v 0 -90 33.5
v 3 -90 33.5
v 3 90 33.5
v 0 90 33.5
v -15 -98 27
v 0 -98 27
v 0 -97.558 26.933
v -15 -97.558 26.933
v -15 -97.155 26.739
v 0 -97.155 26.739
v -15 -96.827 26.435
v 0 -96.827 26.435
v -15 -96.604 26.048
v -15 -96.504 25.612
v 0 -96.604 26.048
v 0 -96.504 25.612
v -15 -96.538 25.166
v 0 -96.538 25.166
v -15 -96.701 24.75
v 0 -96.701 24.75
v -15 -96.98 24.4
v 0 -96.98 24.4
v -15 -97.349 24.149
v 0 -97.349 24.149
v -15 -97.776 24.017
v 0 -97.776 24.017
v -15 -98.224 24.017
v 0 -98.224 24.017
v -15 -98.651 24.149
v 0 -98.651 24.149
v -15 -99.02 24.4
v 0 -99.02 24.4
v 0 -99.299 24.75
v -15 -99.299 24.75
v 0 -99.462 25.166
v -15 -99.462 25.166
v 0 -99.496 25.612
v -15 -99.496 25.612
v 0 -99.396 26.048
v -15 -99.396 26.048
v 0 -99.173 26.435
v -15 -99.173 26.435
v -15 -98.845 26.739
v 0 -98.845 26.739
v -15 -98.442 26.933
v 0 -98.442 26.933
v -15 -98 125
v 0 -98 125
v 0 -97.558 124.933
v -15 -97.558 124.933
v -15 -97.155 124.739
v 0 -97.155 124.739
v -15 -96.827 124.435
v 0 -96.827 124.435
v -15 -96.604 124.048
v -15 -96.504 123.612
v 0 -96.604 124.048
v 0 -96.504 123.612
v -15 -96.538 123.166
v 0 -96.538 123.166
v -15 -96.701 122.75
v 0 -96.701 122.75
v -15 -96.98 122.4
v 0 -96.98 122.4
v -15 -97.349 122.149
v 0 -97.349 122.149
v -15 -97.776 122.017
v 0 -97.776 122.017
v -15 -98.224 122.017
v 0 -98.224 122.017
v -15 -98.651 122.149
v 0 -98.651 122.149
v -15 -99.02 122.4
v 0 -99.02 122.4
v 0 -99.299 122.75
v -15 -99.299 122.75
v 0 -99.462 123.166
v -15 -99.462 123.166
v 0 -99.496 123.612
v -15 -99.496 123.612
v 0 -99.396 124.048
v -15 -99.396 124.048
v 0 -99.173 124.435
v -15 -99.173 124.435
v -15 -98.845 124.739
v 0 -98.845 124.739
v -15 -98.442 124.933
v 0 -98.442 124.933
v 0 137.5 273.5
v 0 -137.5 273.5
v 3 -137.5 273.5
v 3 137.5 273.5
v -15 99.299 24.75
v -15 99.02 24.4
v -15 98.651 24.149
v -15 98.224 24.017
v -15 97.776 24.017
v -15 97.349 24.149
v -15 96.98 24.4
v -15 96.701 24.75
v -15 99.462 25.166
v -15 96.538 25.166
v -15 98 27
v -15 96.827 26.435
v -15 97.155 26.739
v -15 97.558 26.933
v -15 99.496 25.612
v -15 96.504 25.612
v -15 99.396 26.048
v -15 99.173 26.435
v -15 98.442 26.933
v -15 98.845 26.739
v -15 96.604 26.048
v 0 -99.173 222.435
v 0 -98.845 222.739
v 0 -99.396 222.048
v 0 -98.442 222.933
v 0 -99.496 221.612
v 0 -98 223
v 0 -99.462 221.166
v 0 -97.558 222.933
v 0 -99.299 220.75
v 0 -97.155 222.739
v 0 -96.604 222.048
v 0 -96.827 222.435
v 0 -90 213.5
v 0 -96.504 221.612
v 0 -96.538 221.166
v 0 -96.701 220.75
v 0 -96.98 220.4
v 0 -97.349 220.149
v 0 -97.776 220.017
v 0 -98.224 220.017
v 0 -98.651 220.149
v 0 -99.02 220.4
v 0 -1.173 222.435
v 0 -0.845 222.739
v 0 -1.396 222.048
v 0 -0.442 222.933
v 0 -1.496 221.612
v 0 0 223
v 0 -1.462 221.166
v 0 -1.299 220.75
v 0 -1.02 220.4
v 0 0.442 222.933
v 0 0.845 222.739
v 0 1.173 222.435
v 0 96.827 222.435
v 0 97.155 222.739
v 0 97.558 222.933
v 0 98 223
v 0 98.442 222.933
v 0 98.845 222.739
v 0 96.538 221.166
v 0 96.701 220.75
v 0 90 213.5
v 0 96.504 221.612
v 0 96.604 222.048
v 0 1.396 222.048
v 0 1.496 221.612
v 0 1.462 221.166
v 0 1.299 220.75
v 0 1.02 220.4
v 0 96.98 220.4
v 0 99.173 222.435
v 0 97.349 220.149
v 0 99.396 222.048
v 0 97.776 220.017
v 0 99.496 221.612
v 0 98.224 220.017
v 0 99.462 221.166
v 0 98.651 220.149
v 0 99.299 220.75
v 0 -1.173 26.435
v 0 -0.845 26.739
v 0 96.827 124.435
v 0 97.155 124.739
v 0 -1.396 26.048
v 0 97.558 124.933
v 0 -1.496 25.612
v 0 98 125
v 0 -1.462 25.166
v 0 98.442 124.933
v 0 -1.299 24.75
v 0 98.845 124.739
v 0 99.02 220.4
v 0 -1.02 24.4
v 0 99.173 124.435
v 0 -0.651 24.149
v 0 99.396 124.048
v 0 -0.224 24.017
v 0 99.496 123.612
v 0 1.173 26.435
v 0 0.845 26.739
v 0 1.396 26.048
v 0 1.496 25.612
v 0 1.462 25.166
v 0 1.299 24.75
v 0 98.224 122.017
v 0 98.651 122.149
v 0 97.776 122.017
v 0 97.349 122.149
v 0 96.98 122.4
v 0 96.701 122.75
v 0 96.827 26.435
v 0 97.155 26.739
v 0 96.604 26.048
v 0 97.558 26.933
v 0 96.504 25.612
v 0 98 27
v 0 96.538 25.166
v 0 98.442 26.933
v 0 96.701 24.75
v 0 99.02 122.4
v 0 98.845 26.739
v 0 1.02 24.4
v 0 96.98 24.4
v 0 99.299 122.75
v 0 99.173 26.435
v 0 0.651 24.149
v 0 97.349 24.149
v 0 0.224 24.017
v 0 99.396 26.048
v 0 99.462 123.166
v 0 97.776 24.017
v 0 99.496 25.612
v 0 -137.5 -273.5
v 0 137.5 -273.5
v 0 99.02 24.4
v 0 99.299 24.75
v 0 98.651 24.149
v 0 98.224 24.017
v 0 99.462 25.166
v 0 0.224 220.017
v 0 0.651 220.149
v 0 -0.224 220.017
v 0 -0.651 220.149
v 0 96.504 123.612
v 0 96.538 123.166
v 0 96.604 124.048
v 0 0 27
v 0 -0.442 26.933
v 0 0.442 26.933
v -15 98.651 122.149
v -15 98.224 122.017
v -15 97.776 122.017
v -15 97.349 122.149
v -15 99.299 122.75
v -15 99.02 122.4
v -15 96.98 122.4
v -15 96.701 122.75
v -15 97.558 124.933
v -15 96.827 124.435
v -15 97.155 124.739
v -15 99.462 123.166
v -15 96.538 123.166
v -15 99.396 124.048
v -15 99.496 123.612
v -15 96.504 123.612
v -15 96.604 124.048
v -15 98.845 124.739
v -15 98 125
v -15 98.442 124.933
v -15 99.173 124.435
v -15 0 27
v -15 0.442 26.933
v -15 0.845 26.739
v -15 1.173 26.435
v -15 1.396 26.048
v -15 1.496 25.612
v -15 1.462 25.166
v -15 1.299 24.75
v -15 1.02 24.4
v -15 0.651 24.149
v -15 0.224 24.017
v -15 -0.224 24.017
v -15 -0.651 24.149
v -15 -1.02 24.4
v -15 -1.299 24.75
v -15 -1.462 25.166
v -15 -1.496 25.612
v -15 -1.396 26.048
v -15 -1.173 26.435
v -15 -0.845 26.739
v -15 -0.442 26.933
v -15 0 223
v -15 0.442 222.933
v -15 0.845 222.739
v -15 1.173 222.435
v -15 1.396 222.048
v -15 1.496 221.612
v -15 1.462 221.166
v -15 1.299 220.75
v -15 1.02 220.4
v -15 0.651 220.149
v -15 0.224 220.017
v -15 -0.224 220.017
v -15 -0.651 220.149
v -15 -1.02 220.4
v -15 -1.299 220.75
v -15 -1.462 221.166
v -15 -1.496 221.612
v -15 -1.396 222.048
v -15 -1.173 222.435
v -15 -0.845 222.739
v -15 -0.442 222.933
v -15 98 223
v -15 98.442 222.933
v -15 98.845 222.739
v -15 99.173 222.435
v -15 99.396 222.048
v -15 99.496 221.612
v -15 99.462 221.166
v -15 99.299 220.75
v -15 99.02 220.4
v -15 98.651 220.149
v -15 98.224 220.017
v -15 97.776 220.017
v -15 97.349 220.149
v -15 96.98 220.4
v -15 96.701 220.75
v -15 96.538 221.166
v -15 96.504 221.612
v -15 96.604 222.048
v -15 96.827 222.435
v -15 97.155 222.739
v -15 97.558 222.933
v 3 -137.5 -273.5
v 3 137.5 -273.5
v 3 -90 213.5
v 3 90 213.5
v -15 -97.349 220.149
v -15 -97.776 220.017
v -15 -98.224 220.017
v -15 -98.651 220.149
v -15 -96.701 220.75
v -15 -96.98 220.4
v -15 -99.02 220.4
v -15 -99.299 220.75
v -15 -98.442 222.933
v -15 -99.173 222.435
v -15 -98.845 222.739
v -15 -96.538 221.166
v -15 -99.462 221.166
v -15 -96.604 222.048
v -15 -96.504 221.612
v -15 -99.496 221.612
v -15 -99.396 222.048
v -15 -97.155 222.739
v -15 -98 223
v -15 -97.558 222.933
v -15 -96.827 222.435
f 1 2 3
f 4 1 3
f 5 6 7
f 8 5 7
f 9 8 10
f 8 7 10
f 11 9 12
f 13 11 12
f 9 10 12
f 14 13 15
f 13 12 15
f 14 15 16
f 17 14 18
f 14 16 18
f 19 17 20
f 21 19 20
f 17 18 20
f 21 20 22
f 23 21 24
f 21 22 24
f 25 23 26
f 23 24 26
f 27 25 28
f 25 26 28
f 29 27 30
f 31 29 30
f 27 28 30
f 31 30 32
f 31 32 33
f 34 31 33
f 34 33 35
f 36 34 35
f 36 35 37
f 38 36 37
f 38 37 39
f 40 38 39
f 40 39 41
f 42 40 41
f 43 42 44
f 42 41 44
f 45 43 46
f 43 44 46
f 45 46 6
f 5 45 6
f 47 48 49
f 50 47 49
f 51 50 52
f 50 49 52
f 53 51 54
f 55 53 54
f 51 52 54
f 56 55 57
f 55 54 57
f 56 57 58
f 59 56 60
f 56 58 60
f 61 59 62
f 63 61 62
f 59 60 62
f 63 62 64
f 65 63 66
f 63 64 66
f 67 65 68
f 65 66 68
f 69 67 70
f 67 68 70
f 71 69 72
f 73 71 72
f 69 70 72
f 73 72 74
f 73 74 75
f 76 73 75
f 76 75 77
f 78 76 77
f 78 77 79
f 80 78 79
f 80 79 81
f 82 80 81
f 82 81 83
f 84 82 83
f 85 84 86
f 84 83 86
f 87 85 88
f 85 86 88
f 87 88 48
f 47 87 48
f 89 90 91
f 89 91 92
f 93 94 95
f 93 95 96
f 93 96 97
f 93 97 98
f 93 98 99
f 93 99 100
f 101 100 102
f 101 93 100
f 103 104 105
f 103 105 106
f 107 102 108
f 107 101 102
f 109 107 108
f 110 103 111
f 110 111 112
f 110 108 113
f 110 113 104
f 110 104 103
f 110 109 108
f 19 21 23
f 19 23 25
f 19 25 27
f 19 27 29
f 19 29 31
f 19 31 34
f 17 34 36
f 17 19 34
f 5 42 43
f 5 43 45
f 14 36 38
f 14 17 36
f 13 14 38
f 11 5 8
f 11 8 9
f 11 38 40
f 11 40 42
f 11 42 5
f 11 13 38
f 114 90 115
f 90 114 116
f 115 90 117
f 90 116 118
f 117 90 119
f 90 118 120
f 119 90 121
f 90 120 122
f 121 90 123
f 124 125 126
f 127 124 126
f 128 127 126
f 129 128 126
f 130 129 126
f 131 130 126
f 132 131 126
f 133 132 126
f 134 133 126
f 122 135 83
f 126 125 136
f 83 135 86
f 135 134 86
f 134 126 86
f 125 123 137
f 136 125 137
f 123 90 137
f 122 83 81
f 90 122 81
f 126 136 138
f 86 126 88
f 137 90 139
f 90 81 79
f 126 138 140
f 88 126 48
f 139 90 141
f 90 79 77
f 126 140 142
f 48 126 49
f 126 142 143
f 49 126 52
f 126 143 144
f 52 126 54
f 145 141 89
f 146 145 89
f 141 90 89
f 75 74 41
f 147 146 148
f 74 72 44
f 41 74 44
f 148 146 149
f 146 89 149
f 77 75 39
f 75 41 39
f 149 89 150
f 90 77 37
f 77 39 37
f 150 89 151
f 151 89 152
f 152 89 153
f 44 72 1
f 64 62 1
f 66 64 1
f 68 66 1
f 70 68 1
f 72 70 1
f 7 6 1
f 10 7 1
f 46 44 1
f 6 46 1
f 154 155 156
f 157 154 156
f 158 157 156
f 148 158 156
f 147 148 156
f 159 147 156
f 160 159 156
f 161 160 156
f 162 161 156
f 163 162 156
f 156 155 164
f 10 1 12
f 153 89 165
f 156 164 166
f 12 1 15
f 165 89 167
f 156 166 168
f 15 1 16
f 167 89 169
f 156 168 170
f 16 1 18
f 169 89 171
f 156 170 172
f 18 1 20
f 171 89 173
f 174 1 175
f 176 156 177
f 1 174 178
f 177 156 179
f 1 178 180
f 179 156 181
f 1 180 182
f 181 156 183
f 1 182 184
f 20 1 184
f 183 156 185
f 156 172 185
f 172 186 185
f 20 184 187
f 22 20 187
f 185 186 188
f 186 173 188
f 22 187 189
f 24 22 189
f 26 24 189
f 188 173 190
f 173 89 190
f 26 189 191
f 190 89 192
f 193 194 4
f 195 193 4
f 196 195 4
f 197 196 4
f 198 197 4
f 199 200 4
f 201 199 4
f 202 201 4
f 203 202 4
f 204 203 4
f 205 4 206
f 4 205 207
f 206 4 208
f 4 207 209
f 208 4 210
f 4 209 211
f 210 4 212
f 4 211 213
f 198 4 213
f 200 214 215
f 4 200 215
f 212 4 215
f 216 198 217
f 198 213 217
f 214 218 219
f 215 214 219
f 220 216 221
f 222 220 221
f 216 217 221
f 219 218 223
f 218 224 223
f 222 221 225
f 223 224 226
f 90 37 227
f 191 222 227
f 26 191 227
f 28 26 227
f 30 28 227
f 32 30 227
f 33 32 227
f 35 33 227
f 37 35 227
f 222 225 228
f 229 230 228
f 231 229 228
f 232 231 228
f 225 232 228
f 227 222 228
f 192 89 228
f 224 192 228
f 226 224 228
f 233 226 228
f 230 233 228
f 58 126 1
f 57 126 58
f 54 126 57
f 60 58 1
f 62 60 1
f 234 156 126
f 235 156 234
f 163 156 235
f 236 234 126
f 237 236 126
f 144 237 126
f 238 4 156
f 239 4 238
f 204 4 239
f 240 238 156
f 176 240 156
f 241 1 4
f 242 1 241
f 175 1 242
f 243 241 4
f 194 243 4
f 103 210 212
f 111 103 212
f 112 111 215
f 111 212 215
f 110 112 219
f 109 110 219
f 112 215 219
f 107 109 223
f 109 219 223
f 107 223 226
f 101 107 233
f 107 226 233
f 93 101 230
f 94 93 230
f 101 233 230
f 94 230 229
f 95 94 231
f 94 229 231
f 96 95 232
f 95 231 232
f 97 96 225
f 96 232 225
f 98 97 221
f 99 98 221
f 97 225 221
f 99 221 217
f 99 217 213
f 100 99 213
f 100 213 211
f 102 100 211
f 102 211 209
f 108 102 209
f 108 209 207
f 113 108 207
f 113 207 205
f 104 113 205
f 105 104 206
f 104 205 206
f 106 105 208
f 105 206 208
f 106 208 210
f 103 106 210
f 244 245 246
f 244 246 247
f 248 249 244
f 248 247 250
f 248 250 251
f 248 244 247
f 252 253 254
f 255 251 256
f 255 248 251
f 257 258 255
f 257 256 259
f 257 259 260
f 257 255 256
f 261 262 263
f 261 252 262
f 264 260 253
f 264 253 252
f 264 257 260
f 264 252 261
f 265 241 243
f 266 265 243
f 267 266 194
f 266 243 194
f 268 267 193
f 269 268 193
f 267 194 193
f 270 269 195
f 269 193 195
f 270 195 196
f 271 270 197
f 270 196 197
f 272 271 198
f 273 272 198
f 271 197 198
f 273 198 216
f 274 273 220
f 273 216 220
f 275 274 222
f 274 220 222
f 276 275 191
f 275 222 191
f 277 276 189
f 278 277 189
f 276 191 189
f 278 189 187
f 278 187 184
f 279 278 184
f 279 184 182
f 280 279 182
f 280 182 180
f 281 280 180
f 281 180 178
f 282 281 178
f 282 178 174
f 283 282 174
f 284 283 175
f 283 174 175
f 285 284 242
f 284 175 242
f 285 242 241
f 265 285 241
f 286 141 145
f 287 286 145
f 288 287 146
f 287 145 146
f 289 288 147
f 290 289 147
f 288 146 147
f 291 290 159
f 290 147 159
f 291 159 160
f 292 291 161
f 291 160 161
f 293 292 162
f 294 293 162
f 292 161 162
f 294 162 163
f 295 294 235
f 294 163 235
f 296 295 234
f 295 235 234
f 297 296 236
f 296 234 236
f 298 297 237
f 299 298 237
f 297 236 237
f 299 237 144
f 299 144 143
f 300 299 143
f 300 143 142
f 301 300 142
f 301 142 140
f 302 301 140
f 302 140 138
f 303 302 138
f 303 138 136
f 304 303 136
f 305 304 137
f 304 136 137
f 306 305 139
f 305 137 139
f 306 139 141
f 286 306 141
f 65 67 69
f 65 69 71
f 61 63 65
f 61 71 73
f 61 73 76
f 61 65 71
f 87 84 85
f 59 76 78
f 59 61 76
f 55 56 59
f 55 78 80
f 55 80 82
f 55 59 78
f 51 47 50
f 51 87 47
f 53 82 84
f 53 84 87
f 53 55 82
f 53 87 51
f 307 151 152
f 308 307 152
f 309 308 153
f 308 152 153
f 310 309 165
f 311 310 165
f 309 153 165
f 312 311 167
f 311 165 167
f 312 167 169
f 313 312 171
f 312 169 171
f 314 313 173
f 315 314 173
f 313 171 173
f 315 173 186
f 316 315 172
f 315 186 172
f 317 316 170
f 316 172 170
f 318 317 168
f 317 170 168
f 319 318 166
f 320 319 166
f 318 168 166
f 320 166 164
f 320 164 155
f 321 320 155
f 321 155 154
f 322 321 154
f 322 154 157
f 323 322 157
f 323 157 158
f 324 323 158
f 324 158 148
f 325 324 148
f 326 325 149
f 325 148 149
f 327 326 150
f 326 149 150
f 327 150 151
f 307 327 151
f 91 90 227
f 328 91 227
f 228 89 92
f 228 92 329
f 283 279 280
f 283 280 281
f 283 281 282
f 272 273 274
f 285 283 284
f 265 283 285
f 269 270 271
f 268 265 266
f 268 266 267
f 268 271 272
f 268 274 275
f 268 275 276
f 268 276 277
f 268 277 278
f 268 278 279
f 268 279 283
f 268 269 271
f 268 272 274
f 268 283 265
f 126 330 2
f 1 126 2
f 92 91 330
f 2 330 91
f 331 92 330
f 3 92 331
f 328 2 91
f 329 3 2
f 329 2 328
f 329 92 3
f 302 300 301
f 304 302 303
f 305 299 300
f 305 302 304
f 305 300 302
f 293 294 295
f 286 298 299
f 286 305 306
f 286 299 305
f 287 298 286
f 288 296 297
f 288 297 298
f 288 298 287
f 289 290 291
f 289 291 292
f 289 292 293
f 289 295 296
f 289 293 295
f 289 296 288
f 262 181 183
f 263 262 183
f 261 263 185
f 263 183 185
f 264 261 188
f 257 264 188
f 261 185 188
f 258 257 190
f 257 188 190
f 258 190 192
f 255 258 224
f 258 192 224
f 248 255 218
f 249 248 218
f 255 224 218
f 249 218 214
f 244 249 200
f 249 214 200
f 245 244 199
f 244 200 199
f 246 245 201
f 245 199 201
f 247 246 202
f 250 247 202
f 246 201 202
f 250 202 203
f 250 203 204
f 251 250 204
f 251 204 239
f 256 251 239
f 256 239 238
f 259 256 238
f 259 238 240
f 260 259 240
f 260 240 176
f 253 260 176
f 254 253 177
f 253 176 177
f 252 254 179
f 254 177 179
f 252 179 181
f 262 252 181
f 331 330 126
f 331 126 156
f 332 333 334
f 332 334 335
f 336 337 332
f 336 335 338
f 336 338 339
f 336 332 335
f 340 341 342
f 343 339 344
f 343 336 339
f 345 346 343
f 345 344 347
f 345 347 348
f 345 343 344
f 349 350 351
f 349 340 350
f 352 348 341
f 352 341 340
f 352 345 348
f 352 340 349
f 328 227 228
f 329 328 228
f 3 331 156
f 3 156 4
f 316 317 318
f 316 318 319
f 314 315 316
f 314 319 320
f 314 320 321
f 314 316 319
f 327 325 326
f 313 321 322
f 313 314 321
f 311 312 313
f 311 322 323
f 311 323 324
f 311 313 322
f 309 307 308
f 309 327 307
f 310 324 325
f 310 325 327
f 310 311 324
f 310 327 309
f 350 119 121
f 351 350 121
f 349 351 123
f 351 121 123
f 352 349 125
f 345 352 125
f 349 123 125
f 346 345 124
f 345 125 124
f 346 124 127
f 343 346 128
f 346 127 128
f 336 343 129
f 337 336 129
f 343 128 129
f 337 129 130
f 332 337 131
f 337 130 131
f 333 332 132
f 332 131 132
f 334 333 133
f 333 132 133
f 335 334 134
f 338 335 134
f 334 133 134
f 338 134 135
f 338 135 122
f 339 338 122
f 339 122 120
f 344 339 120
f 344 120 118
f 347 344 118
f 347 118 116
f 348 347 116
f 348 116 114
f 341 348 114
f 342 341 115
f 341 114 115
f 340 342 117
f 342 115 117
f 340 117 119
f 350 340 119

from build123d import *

# Parameters (mm, degrees)
SKETCH1_W           = 547
SKETCH1_H           = 275
BOSS_EXTRUDE1_DEPTH = 3
SKETCH2_W           = 180
SKETCH2_H           = 180
CUT_EXTRUDE1_DEPTH  = 3
SKETCH3_R           = 1.5
BOSS_EXTRUDE2_DEPTH = 15


with BuildPart() as part:
    # Sketch1 → Boss-Extrude1 (new body)
    with BuildSketch(Plane(origin=(0, 0, 0), x_dir=(0, 0, -1), z_dir=(1, 0, 0))):
        Rectangle(SKETCH1_W, SKETCH1_H)
    extrude(amount=BOSS_EXTRUDE1_DEPTH)

    # Sketch2 → Cut-Extrude1 (cut)
    with BuildSketch(Plane(origin=(3, 0, 0), x_dir=(0, 0, -1), z_dir=(1, 0, 0))):
        with Locations((-123.5, 0)):
            Rectangle(SKETCH2_W, SKETCH2_H)
    extrude(amount=-CUT_EXTRUDE1_DEPTH, mode=Mode.SUBTRACT)

    # Sketch3 → Boss-Extrude2 (add)
    with BuildSketch(Plane.ZY):
        with Locations((25.5, 98)):
            Circle(SKETCH3_R)
        with Locations((221.5, -98)):
            Circle(SKETCH3_R)
        with Locations((123.5, 98)):
            Circle(SKETCH3_R)
        with Locations((221.5, 98)):
            Circle(SKETCH3_R)
        with Locations((123.5, -98)):
            Circle(SKETCH3_R)
        with Locations((25.5, -98)):
            Circle(SKETCH3_R)
        with Locations((25.5, 0)):
            Circle(SKETCH3_R)
        with Locations((221.5, 0)):
            Circle(SKETCH3_R)
    extrude(amount=BOSS_EXTRUDE2_DEPTH)


solid = part.part
